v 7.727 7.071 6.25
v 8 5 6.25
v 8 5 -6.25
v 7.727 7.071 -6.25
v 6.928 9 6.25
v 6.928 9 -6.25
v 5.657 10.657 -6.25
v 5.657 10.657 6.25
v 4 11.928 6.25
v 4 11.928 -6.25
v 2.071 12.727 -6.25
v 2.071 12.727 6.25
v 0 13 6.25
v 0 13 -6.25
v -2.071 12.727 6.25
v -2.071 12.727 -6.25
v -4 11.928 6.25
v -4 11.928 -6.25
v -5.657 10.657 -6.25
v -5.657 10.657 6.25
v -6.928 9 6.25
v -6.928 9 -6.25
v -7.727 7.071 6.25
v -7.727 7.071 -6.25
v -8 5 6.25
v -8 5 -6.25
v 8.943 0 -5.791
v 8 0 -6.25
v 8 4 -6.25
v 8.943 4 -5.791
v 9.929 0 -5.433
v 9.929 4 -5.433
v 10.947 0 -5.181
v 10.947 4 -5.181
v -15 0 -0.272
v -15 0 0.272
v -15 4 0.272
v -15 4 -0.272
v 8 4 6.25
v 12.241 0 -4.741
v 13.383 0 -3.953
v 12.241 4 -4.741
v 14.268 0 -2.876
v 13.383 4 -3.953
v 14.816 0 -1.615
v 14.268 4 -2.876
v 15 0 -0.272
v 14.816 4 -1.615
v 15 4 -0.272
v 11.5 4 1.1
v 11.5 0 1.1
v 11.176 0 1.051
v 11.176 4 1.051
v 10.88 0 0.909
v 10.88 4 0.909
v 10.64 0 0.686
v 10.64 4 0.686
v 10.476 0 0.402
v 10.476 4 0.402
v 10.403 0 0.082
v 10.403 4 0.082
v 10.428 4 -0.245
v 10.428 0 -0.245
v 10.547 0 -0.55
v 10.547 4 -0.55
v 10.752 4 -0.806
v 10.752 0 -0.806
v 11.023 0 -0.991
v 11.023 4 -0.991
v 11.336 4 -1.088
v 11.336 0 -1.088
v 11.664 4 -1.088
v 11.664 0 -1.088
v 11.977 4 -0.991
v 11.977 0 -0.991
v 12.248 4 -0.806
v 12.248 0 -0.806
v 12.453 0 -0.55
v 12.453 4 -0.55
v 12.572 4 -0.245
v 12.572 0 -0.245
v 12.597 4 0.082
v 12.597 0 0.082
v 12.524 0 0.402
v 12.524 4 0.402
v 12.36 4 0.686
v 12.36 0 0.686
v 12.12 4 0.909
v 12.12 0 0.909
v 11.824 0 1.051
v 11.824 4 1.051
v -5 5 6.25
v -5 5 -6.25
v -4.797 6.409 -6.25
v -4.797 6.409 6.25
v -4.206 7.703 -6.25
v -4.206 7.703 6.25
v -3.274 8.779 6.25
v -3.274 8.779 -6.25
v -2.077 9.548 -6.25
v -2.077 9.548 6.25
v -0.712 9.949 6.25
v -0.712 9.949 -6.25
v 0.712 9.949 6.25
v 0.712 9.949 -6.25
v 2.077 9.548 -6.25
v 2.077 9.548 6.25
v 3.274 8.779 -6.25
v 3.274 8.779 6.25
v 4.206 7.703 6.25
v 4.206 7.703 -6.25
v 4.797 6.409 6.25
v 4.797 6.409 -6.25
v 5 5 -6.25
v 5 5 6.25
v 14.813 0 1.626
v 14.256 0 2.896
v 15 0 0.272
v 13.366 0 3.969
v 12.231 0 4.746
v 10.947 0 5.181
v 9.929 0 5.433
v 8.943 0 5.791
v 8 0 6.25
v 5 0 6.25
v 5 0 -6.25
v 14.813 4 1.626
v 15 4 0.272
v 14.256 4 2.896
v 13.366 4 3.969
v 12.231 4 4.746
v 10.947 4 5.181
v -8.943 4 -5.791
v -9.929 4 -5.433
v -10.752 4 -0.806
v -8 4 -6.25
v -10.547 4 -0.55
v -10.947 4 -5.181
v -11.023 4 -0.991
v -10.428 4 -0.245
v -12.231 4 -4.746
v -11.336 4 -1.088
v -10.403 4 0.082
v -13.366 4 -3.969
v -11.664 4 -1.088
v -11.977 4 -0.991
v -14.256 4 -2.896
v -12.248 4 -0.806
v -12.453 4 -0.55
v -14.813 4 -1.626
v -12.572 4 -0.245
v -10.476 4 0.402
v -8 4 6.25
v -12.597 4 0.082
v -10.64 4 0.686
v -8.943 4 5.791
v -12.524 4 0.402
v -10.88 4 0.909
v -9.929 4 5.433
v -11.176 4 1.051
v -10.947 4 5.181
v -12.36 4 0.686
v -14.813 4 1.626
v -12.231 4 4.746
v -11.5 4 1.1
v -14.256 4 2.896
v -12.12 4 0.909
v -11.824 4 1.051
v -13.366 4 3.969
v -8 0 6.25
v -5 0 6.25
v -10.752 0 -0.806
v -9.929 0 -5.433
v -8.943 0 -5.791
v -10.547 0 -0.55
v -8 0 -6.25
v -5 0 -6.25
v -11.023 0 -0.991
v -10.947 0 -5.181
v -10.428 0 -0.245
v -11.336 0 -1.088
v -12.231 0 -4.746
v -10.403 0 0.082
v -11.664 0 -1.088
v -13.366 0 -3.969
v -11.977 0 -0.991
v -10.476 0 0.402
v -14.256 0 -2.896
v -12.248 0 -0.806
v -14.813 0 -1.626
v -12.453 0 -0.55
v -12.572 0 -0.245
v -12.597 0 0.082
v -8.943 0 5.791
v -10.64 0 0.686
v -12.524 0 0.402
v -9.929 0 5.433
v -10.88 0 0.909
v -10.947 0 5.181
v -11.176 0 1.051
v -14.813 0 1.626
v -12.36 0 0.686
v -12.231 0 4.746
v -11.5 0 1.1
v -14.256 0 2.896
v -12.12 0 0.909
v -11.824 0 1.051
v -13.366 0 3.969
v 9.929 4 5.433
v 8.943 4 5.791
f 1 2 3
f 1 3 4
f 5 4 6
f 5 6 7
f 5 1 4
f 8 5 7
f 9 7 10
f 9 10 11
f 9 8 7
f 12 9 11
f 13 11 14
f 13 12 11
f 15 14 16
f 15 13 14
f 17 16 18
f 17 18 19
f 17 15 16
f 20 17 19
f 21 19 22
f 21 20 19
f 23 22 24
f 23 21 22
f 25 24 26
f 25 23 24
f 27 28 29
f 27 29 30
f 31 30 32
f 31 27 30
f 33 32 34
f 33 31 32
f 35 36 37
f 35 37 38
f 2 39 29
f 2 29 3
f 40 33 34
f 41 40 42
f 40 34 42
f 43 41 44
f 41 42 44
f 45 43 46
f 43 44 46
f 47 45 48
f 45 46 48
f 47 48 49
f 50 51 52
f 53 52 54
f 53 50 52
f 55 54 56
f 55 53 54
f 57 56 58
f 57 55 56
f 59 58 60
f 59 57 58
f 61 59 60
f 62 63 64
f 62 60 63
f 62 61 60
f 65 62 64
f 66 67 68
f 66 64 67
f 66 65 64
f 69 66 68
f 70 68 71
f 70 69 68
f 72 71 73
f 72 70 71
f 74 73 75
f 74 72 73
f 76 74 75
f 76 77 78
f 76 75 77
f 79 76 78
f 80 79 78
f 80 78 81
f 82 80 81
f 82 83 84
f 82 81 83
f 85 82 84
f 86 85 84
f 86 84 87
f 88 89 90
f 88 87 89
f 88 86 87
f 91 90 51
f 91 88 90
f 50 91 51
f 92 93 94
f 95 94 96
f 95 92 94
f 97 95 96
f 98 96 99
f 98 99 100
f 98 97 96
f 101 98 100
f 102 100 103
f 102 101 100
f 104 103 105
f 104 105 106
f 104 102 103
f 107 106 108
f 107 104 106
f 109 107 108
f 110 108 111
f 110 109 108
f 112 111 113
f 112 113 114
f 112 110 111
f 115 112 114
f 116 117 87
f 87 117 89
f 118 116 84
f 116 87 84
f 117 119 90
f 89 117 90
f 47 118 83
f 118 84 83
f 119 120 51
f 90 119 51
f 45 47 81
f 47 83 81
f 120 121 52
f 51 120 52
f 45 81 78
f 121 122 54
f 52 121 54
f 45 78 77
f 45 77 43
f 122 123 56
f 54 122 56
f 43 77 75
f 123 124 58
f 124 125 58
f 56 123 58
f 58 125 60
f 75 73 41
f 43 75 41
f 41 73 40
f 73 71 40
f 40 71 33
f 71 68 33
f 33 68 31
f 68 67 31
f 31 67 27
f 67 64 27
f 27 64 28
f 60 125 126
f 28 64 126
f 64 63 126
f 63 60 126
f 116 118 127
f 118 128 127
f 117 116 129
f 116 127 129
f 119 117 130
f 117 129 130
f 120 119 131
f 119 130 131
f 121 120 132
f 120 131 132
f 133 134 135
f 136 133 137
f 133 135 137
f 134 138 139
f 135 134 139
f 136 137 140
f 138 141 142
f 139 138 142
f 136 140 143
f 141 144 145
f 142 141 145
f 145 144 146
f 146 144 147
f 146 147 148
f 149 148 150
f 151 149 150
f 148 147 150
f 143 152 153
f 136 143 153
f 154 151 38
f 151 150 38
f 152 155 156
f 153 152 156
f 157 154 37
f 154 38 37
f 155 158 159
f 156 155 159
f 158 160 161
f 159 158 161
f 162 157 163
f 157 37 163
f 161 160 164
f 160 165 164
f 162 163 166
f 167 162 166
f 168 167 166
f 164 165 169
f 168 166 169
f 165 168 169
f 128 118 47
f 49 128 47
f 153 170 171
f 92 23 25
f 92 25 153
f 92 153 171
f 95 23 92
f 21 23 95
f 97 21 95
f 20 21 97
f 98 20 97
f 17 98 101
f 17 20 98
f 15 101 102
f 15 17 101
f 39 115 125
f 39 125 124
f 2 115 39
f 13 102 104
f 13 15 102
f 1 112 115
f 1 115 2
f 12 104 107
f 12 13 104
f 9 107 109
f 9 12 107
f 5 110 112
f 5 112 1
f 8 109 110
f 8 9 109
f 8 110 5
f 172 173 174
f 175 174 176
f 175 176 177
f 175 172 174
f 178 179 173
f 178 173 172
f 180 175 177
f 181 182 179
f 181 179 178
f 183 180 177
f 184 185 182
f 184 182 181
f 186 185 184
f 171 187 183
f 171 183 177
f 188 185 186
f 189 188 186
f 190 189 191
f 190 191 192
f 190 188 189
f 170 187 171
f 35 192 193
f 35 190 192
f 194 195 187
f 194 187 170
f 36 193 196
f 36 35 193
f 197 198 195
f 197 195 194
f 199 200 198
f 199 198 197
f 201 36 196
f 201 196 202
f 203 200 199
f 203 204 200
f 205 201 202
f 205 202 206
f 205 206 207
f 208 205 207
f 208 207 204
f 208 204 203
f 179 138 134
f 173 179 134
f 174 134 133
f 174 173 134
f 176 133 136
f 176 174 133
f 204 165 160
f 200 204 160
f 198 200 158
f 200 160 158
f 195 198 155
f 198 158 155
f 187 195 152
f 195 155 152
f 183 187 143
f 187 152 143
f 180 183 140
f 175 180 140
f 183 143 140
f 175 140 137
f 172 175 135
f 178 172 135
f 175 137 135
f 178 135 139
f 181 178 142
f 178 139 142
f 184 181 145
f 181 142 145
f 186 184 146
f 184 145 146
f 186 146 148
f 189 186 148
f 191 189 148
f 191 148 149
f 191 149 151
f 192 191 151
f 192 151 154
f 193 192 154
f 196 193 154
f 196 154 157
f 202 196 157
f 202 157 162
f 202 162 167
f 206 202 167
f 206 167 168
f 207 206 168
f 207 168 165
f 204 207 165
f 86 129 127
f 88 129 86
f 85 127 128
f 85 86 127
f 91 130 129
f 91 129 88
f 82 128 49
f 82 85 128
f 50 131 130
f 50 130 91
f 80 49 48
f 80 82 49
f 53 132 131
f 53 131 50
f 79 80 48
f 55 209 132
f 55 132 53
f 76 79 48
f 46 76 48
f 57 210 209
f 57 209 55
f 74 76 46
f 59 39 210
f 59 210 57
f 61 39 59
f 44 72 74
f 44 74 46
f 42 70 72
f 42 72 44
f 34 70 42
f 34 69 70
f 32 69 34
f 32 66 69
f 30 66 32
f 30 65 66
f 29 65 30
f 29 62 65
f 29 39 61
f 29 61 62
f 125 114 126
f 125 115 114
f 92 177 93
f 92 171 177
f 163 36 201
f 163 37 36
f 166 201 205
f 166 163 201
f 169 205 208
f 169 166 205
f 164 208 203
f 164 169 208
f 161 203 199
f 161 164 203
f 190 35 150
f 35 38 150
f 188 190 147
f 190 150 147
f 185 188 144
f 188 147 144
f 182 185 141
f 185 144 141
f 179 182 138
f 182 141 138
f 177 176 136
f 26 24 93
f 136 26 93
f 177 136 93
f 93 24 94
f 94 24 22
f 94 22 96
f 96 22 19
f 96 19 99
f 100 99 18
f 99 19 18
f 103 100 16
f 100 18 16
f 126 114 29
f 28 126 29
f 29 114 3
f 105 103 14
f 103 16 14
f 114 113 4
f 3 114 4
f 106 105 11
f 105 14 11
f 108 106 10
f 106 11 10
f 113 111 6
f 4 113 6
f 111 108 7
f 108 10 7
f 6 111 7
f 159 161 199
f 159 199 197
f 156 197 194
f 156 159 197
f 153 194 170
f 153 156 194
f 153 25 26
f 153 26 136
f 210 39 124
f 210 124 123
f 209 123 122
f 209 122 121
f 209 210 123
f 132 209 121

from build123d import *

# Parameters (mm, degrees)
BOSS_EXTRUDE1_DEPTH = 6.25
BOSS_EXTRUDE4_REACH = 29.149
SKETCH5_W           = 10
SKETCH5_H           = 4
FILLET1_R           = 10
FILLET2_R           = 5
SKETCH7_R           = 1.1
CUT_EXTRUDE2_DEPTH  = 19.575858103
FILLET6_R           = 10
FILLET7_R           = 5


with BuildPart() as part:
    # Sketch1 → Boss-Extrude1 (new, symmetric)
    with BuildSketch(Plane.XY):
        with BuildLine():
            Line((5, 5), (5, 0))
            Line((5, 0), (8, 0))
            Line((8, 0), (8, 5))
            ThreePointArc((8, 5), (0, 13), (-8, 5))
            Line((-8, 5), (-8, 0))
            Line((-8, 0), (-5, 0))
            Line((-5, 0), (-5, 5))
            ThreePointArc((-5, 5), (0, 10), (5, 5))
        make_face()
    extrude(amount=BOSS_EXTRUDE1_DEPTH, both=True)

    # Sketch5 → Boss-Extrude4 (add, up to next)
    with BuildSketch(Plane(origin=(-15, 0, 0), x_dir=(0, 0, -1), z_dir=(1, 0, 0)), mode=Mode.PRIVATE) as boss_extrude4_sk1:
        with Locations((0, 2)):
            Rectangle(SKETCH5_W, SKETCH5_H)
    boss_extrude4_tool1 = extrude(boss_extrude4_sk1.sketch, amount=BOSS_EXTRUDE4_REACH, mode=Mode.PRIVATE) - part.part
    boss_extrude4 = boss_extrude4_tool1.solids().sort_by_distance((-15, 2, 0))[0]
    add(boss_extrude4)

    # Fillet1
    # the kernel refuses this fillet: 10 mm, written as the material it adds along each edge
    with BuildSketch(Plane(origin=(-8, 0, -5), x_dir=(0, 0, -1), z_dir=(0, 1, 0)), Plane(origin=(-8, 4, 5), x_dir=(0, 0, 1), z_dir=(0, -1, 0))) as fillet1_piece_1:
        with BuildLine():
            CenterArc((10, 4.841229183), FILLET1_R, 180, 28.955024372)
            Line((0, 4.841229183), (-0.2, 4.841229183))
            Line((-0.2, 4.841229183), (-0.2, 0))
            Line((-0.2, 0), (0, -0.2))
            ThreePointArc((0, -0.2), (0.625, -0.2), (1.075, -0.096824584))
            Line((1.075, -0.096824584), (1.25, 0))
        make_face()
    extrude(amount=4)

    # Fillet2
    fillet2_edges = [part.edges().sort_by_distance(p)[0] for p in [
        (-15, 2, -5),
        (-15, 2, 5),
    ]]
    fillet(fillet2_edges, radius=FILLET2_R)

    # Sketch7 → Cut-Extrude2 (cut, through all)
    with BuildSketch(Plane(origin=(0, 4, 0), x_dir=(1, 0, 0), z_dir=(0, 1, 0))):
        with Locations(Location((-11.5, 0, 0), (0, 0, 270))):
            Circle(SKETCH7_R)
    cut_extrude2 = extrude(amount=-CUT_EXTRUDE2_DEPTH, mode=Mode.SUBTRACT)

    # Mirror6: Boss-Extrude4 across plane
    add(boss_extrude4.mirror(Plane(origin=(0, 0, 0), x_dir=(0, 0, 1), z_dir=(1, 0, 0))))

    # Mirror7: Cut-Extrude2 across plane
    add(cut_extrude2.mirror(Plane(origin=(0, 0, 0), x_dir=(0, 0, 1), z_dir=(1, 0, 0))), mode=Mode.SUBTRACT)

    # Fillet6
    # the kernel refuses this fillet: 10 mm, written as the material it adds along each edge
    with BuildSketch(Plane(origin=(8, 4, 5), x_dir=(0, 0, 1), z_dir=(0, -1, 0)), Plane(origin=(8, 0, -5), x_dir=(0, 0, -1), z_dir=(0, 1, 0))) as fillet6_piece_1:
        with BuildLine():
            CenterArc((10, -4.841229183), FILLET6_R, 151.044975628, 28.955024372)
            Line((0, -4.841229183), (-0.2, -4.841229183))
            Line((-0.2, -4.841229183), (-0.2, 0))
            Line((-0.2, 0), (0, 0.2))
            ThreePointArc((0, 0.2), (0.625, 0.2), (1.075, 0.096824584))
            Line((1.075, 0.096824584), (1.25, 0))
        make_face()
    extrude(amount=4)

    # Fillet7
    fillet7_edges = [part.edges().sort_by_distance(p)[0] for p in [
        (15, 2, 5),
        (15, 2, -5),
    ]]
    fillet(fillet7_edges, radius=FILLET7_R)


solid = part.part
